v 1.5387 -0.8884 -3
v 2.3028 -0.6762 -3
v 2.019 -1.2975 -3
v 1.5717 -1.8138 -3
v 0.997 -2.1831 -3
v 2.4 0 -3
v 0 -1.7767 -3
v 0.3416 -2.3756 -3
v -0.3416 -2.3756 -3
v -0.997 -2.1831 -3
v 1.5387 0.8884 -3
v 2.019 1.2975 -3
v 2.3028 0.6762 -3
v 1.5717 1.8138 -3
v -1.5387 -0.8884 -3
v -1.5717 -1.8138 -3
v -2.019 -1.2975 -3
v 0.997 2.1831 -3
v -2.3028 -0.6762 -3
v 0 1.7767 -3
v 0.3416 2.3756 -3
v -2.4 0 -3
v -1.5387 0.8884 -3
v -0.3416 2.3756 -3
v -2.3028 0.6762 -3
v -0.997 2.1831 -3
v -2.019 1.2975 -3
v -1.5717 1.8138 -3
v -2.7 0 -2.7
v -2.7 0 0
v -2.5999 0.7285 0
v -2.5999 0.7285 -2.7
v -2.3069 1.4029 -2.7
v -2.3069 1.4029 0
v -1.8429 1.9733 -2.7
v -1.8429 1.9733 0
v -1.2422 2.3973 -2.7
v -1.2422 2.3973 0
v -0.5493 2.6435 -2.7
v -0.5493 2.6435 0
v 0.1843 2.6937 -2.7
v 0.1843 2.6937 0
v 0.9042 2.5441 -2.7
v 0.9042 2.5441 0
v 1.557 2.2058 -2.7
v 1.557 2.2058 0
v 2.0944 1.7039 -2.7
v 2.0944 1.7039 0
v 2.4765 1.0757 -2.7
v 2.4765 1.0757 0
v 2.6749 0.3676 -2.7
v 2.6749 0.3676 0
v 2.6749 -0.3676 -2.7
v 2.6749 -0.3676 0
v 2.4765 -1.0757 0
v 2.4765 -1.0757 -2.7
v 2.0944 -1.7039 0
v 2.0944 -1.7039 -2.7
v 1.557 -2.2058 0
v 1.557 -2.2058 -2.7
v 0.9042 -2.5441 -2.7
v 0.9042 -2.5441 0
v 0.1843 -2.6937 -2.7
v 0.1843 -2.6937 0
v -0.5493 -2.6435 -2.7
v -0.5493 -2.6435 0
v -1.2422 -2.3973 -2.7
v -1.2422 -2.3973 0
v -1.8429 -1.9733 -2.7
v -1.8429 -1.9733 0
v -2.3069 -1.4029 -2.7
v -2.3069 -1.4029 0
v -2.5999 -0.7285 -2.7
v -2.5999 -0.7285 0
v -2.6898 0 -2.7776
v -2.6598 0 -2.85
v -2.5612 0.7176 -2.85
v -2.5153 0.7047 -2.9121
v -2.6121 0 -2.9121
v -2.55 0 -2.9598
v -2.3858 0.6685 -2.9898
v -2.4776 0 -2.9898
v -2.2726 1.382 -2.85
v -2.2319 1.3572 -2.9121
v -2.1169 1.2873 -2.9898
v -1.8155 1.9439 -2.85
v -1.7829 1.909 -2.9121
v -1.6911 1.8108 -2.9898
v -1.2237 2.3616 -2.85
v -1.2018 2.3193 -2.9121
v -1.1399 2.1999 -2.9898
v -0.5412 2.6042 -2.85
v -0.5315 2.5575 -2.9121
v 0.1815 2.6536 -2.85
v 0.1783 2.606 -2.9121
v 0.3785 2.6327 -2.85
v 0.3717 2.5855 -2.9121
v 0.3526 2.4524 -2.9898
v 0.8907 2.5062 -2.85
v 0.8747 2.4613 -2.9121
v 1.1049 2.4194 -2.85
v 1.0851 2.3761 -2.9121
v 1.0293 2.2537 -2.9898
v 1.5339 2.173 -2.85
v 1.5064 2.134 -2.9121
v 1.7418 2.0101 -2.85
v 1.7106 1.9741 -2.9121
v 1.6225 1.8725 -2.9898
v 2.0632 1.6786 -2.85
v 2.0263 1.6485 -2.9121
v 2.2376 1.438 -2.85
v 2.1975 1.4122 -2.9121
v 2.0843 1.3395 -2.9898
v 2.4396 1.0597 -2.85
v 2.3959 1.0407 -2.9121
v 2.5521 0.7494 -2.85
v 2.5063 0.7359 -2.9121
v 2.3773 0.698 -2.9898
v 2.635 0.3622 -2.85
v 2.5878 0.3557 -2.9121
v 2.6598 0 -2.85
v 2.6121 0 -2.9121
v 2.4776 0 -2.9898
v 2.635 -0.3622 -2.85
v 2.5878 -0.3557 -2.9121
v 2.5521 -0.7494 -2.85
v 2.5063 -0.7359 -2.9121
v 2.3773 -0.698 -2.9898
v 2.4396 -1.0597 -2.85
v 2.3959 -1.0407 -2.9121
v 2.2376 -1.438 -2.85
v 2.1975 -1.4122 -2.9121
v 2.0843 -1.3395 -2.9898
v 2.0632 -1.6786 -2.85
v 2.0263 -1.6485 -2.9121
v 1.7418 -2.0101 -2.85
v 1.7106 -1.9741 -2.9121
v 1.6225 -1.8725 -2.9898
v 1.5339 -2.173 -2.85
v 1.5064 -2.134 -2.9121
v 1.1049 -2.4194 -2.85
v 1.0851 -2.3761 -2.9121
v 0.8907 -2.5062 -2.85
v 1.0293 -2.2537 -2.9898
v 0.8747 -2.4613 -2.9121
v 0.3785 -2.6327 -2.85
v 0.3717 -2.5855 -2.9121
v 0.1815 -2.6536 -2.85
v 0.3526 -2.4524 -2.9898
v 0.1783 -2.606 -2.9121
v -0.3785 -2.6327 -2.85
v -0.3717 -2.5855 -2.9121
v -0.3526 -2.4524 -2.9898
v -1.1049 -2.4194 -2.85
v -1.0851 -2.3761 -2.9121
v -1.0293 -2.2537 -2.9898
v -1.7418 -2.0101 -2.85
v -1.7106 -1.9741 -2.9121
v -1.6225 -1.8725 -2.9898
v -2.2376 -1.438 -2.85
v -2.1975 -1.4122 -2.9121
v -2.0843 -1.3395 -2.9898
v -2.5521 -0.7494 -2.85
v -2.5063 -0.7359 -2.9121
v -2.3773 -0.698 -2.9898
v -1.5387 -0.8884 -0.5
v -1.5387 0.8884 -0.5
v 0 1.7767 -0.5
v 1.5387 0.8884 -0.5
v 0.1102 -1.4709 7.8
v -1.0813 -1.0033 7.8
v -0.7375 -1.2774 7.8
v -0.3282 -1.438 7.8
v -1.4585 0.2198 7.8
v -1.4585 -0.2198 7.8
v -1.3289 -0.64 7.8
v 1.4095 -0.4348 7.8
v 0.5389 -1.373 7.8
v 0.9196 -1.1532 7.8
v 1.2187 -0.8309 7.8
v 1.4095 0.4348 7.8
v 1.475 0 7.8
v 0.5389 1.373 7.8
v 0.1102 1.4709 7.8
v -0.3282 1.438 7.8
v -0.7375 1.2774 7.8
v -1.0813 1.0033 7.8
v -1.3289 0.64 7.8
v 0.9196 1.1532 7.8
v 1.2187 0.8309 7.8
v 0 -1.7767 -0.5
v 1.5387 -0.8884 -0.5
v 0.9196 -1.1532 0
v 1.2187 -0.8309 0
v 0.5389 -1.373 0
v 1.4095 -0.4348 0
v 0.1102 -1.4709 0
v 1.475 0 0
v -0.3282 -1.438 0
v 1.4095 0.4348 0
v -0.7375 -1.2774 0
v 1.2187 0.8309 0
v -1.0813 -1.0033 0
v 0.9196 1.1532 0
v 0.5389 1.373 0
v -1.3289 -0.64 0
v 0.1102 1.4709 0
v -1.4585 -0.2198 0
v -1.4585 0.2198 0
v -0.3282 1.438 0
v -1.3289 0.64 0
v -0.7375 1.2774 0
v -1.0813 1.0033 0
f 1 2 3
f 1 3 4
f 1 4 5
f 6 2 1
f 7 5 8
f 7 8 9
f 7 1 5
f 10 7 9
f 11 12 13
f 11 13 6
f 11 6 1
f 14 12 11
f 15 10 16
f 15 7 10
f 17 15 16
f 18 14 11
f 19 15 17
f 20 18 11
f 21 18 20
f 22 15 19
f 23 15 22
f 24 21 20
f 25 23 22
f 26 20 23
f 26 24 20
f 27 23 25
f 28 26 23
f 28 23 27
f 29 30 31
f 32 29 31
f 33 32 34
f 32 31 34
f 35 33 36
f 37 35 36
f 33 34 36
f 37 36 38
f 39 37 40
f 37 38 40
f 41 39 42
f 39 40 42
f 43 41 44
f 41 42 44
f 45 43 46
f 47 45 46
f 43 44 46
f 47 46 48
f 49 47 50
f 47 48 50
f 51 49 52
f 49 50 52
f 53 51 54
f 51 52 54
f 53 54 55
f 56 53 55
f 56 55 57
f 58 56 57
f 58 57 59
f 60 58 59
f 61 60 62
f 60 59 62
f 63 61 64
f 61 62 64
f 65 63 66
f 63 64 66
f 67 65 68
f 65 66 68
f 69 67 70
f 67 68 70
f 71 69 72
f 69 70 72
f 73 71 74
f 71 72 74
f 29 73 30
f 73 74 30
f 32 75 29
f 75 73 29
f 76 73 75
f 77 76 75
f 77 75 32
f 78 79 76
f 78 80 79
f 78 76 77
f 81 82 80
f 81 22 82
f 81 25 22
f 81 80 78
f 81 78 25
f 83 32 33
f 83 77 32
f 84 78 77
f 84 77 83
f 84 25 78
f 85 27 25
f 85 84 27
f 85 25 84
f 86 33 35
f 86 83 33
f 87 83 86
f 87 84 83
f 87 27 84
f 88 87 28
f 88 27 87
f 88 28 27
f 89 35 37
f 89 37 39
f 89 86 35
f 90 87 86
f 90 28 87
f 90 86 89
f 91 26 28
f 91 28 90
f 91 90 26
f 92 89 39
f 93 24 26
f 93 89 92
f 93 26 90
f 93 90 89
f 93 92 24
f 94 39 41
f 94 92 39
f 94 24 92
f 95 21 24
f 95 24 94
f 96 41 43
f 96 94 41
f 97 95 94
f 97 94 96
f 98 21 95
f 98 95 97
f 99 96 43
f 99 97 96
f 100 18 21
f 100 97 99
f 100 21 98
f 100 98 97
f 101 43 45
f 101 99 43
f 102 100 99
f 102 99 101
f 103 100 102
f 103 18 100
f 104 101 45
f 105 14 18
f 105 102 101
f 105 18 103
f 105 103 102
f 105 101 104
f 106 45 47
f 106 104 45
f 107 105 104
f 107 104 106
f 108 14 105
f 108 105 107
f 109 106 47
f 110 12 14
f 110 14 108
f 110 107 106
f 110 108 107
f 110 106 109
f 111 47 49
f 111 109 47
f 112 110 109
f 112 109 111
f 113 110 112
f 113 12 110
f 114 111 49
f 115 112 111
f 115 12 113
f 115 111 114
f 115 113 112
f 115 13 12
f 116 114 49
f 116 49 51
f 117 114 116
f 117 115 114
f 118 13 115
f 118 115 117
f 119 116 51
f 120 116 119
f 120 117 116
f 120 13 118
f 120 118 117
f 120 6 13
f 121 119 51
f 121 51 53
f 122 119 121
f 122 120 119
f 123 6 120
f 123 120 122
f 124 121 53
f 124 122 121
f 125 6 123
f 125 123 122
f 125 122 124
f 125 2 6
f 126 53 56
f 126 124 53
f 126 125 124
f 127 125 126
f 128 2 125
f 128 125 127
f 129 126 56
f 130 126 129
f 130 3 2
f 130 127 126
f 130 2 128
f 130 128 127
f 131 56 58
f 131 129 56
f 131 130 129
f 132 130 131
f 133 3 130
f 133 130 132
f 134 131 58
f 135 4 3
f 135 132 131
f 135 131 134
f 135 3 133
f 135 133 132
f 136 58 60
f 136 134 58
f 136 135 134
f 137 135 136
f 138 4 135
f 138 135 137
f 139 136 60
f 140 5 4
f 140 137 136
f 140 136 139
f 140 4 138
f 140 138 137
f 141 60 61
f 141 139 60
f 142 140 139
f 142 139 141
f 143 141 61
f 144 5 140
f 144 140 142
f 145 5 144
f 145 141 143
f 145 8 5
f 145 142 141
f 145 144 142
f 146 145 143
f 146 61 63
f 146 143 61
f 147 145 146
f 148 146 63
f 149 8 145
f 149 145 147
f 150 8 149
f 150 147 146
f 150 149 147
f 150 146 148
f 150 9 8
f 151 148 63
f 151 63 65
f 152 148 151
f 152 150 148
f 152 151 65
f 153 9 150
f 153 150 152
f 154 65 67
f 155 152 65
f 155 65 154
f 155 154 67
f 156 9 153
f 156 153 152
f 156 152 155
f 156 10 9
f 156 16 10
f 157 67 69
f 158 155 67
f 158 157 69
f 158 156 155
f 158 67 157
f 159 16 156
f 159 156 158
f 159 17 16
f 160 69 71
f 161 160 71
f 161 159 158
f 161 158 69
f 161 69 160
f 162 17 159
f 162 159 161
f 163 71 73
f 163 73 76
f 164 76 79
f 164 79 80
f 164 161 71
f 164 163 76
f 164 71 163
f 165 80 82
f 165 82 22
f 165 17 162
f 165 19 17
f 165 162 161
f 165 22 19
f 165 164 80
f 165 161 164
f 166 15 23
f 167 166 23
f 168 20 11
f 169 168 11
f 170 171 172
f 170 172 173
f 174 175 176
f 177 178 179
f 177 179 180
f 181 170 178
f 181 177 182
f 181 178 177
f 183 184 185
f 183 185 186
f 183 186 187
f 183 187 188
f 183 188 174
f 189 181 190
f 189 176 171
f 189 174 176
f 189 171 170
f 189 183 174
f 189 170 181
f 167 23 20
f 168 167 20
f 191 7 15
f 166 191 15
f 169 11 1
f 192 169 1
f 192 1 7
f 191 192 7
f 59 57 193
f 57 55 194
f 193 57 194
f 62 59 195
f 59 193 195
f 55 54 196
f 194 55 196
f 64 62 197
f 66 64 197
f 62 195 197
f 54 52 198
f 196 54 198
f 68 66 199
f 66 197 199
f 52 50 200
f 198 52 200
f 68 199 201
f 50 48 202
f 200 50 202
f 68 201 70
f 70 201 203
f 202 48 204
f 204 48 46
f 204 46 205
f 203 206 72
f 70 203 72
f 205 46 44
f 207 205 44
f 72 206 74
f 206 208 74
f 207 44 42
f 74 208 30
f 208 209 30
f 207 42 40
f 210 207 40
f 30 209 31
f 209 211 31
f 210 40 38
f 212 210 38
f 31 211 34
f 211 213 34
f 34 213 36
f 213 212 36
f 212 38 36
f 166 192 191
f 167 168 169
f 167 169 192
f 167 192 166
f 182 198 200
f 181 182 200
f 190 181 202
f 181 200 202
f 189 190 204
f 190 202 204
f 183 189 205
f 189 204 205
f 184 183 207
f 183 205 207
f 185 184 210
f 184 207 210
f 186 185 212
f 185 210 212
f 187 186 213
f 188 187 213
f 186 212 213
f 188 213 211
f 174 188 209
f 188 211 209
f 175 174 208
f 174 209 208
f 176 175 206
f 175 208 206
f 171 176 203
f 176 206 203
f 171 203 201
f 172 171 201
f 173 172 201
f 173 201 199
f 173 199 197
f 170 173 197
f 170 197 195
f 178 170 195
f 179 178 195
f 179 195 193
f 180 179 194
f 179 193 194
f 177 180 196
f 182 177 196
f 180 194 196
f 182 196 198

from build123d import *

# Parameters (mm, degrees)
CROQUIS1_R              = 1.475
SALIENTE_EXTRUIR1_DEPTH = 7.8
CROQUIS2_R              = 2.7
SALIENTE_EXTRUIR2_DEPTH = 3
CORTAR_EXTRUIR1_DEPTH   = 2.5
REDONDEO1_R             = 0.3


with BuildPart() as part:
    # Croquis1 → Saliente-Extruir1 (new body)
    with BuildSketch(Plane.XY):
        Circle(CROQUIS1_R)
    extrude(amount=SALIENTE_EXTRUIR1_DEPTH)

    # Croquis2 → Saliente-Extruir2 (add)
    with BuildSketch(Plane(origin=(0, 0, 0), x_dir=(-1, 0, 0), z_dir=(0, 0, -1))):
        Circle(CROQUIS2_R)
    extrude(amount=SALIENTE_EXTRUIR2_DEPTH)

    # Croquis3 → Cortar-Extruir1 (cut)
    with BuildSketch(Plane(origin=(0, 0, -3), x_dir=(-1, 0, 0), z_dir=(0, 0, -1))):
        Polygon((0, -1.776735144), (1.53869777, -0.888367572), (1.53869777, 0.888367572), (0, 1.776735144), (-1.53869777, 0.888367572), (-1.53869777, -0.888367572), align=None)
    extrude(amount=-CORTAR_EXTRUIR1_DEPTH, mode=Mode.SUBTRACT)

    # Redondeo1
    redondeo1_edges = [part.edges().sort_by_distance(p)[0] for p in [
        (2.7, 0, -3),
    ]]
    fillet(redondeo1_edges, radius=REDONDEO1_R)


solid = part.part
